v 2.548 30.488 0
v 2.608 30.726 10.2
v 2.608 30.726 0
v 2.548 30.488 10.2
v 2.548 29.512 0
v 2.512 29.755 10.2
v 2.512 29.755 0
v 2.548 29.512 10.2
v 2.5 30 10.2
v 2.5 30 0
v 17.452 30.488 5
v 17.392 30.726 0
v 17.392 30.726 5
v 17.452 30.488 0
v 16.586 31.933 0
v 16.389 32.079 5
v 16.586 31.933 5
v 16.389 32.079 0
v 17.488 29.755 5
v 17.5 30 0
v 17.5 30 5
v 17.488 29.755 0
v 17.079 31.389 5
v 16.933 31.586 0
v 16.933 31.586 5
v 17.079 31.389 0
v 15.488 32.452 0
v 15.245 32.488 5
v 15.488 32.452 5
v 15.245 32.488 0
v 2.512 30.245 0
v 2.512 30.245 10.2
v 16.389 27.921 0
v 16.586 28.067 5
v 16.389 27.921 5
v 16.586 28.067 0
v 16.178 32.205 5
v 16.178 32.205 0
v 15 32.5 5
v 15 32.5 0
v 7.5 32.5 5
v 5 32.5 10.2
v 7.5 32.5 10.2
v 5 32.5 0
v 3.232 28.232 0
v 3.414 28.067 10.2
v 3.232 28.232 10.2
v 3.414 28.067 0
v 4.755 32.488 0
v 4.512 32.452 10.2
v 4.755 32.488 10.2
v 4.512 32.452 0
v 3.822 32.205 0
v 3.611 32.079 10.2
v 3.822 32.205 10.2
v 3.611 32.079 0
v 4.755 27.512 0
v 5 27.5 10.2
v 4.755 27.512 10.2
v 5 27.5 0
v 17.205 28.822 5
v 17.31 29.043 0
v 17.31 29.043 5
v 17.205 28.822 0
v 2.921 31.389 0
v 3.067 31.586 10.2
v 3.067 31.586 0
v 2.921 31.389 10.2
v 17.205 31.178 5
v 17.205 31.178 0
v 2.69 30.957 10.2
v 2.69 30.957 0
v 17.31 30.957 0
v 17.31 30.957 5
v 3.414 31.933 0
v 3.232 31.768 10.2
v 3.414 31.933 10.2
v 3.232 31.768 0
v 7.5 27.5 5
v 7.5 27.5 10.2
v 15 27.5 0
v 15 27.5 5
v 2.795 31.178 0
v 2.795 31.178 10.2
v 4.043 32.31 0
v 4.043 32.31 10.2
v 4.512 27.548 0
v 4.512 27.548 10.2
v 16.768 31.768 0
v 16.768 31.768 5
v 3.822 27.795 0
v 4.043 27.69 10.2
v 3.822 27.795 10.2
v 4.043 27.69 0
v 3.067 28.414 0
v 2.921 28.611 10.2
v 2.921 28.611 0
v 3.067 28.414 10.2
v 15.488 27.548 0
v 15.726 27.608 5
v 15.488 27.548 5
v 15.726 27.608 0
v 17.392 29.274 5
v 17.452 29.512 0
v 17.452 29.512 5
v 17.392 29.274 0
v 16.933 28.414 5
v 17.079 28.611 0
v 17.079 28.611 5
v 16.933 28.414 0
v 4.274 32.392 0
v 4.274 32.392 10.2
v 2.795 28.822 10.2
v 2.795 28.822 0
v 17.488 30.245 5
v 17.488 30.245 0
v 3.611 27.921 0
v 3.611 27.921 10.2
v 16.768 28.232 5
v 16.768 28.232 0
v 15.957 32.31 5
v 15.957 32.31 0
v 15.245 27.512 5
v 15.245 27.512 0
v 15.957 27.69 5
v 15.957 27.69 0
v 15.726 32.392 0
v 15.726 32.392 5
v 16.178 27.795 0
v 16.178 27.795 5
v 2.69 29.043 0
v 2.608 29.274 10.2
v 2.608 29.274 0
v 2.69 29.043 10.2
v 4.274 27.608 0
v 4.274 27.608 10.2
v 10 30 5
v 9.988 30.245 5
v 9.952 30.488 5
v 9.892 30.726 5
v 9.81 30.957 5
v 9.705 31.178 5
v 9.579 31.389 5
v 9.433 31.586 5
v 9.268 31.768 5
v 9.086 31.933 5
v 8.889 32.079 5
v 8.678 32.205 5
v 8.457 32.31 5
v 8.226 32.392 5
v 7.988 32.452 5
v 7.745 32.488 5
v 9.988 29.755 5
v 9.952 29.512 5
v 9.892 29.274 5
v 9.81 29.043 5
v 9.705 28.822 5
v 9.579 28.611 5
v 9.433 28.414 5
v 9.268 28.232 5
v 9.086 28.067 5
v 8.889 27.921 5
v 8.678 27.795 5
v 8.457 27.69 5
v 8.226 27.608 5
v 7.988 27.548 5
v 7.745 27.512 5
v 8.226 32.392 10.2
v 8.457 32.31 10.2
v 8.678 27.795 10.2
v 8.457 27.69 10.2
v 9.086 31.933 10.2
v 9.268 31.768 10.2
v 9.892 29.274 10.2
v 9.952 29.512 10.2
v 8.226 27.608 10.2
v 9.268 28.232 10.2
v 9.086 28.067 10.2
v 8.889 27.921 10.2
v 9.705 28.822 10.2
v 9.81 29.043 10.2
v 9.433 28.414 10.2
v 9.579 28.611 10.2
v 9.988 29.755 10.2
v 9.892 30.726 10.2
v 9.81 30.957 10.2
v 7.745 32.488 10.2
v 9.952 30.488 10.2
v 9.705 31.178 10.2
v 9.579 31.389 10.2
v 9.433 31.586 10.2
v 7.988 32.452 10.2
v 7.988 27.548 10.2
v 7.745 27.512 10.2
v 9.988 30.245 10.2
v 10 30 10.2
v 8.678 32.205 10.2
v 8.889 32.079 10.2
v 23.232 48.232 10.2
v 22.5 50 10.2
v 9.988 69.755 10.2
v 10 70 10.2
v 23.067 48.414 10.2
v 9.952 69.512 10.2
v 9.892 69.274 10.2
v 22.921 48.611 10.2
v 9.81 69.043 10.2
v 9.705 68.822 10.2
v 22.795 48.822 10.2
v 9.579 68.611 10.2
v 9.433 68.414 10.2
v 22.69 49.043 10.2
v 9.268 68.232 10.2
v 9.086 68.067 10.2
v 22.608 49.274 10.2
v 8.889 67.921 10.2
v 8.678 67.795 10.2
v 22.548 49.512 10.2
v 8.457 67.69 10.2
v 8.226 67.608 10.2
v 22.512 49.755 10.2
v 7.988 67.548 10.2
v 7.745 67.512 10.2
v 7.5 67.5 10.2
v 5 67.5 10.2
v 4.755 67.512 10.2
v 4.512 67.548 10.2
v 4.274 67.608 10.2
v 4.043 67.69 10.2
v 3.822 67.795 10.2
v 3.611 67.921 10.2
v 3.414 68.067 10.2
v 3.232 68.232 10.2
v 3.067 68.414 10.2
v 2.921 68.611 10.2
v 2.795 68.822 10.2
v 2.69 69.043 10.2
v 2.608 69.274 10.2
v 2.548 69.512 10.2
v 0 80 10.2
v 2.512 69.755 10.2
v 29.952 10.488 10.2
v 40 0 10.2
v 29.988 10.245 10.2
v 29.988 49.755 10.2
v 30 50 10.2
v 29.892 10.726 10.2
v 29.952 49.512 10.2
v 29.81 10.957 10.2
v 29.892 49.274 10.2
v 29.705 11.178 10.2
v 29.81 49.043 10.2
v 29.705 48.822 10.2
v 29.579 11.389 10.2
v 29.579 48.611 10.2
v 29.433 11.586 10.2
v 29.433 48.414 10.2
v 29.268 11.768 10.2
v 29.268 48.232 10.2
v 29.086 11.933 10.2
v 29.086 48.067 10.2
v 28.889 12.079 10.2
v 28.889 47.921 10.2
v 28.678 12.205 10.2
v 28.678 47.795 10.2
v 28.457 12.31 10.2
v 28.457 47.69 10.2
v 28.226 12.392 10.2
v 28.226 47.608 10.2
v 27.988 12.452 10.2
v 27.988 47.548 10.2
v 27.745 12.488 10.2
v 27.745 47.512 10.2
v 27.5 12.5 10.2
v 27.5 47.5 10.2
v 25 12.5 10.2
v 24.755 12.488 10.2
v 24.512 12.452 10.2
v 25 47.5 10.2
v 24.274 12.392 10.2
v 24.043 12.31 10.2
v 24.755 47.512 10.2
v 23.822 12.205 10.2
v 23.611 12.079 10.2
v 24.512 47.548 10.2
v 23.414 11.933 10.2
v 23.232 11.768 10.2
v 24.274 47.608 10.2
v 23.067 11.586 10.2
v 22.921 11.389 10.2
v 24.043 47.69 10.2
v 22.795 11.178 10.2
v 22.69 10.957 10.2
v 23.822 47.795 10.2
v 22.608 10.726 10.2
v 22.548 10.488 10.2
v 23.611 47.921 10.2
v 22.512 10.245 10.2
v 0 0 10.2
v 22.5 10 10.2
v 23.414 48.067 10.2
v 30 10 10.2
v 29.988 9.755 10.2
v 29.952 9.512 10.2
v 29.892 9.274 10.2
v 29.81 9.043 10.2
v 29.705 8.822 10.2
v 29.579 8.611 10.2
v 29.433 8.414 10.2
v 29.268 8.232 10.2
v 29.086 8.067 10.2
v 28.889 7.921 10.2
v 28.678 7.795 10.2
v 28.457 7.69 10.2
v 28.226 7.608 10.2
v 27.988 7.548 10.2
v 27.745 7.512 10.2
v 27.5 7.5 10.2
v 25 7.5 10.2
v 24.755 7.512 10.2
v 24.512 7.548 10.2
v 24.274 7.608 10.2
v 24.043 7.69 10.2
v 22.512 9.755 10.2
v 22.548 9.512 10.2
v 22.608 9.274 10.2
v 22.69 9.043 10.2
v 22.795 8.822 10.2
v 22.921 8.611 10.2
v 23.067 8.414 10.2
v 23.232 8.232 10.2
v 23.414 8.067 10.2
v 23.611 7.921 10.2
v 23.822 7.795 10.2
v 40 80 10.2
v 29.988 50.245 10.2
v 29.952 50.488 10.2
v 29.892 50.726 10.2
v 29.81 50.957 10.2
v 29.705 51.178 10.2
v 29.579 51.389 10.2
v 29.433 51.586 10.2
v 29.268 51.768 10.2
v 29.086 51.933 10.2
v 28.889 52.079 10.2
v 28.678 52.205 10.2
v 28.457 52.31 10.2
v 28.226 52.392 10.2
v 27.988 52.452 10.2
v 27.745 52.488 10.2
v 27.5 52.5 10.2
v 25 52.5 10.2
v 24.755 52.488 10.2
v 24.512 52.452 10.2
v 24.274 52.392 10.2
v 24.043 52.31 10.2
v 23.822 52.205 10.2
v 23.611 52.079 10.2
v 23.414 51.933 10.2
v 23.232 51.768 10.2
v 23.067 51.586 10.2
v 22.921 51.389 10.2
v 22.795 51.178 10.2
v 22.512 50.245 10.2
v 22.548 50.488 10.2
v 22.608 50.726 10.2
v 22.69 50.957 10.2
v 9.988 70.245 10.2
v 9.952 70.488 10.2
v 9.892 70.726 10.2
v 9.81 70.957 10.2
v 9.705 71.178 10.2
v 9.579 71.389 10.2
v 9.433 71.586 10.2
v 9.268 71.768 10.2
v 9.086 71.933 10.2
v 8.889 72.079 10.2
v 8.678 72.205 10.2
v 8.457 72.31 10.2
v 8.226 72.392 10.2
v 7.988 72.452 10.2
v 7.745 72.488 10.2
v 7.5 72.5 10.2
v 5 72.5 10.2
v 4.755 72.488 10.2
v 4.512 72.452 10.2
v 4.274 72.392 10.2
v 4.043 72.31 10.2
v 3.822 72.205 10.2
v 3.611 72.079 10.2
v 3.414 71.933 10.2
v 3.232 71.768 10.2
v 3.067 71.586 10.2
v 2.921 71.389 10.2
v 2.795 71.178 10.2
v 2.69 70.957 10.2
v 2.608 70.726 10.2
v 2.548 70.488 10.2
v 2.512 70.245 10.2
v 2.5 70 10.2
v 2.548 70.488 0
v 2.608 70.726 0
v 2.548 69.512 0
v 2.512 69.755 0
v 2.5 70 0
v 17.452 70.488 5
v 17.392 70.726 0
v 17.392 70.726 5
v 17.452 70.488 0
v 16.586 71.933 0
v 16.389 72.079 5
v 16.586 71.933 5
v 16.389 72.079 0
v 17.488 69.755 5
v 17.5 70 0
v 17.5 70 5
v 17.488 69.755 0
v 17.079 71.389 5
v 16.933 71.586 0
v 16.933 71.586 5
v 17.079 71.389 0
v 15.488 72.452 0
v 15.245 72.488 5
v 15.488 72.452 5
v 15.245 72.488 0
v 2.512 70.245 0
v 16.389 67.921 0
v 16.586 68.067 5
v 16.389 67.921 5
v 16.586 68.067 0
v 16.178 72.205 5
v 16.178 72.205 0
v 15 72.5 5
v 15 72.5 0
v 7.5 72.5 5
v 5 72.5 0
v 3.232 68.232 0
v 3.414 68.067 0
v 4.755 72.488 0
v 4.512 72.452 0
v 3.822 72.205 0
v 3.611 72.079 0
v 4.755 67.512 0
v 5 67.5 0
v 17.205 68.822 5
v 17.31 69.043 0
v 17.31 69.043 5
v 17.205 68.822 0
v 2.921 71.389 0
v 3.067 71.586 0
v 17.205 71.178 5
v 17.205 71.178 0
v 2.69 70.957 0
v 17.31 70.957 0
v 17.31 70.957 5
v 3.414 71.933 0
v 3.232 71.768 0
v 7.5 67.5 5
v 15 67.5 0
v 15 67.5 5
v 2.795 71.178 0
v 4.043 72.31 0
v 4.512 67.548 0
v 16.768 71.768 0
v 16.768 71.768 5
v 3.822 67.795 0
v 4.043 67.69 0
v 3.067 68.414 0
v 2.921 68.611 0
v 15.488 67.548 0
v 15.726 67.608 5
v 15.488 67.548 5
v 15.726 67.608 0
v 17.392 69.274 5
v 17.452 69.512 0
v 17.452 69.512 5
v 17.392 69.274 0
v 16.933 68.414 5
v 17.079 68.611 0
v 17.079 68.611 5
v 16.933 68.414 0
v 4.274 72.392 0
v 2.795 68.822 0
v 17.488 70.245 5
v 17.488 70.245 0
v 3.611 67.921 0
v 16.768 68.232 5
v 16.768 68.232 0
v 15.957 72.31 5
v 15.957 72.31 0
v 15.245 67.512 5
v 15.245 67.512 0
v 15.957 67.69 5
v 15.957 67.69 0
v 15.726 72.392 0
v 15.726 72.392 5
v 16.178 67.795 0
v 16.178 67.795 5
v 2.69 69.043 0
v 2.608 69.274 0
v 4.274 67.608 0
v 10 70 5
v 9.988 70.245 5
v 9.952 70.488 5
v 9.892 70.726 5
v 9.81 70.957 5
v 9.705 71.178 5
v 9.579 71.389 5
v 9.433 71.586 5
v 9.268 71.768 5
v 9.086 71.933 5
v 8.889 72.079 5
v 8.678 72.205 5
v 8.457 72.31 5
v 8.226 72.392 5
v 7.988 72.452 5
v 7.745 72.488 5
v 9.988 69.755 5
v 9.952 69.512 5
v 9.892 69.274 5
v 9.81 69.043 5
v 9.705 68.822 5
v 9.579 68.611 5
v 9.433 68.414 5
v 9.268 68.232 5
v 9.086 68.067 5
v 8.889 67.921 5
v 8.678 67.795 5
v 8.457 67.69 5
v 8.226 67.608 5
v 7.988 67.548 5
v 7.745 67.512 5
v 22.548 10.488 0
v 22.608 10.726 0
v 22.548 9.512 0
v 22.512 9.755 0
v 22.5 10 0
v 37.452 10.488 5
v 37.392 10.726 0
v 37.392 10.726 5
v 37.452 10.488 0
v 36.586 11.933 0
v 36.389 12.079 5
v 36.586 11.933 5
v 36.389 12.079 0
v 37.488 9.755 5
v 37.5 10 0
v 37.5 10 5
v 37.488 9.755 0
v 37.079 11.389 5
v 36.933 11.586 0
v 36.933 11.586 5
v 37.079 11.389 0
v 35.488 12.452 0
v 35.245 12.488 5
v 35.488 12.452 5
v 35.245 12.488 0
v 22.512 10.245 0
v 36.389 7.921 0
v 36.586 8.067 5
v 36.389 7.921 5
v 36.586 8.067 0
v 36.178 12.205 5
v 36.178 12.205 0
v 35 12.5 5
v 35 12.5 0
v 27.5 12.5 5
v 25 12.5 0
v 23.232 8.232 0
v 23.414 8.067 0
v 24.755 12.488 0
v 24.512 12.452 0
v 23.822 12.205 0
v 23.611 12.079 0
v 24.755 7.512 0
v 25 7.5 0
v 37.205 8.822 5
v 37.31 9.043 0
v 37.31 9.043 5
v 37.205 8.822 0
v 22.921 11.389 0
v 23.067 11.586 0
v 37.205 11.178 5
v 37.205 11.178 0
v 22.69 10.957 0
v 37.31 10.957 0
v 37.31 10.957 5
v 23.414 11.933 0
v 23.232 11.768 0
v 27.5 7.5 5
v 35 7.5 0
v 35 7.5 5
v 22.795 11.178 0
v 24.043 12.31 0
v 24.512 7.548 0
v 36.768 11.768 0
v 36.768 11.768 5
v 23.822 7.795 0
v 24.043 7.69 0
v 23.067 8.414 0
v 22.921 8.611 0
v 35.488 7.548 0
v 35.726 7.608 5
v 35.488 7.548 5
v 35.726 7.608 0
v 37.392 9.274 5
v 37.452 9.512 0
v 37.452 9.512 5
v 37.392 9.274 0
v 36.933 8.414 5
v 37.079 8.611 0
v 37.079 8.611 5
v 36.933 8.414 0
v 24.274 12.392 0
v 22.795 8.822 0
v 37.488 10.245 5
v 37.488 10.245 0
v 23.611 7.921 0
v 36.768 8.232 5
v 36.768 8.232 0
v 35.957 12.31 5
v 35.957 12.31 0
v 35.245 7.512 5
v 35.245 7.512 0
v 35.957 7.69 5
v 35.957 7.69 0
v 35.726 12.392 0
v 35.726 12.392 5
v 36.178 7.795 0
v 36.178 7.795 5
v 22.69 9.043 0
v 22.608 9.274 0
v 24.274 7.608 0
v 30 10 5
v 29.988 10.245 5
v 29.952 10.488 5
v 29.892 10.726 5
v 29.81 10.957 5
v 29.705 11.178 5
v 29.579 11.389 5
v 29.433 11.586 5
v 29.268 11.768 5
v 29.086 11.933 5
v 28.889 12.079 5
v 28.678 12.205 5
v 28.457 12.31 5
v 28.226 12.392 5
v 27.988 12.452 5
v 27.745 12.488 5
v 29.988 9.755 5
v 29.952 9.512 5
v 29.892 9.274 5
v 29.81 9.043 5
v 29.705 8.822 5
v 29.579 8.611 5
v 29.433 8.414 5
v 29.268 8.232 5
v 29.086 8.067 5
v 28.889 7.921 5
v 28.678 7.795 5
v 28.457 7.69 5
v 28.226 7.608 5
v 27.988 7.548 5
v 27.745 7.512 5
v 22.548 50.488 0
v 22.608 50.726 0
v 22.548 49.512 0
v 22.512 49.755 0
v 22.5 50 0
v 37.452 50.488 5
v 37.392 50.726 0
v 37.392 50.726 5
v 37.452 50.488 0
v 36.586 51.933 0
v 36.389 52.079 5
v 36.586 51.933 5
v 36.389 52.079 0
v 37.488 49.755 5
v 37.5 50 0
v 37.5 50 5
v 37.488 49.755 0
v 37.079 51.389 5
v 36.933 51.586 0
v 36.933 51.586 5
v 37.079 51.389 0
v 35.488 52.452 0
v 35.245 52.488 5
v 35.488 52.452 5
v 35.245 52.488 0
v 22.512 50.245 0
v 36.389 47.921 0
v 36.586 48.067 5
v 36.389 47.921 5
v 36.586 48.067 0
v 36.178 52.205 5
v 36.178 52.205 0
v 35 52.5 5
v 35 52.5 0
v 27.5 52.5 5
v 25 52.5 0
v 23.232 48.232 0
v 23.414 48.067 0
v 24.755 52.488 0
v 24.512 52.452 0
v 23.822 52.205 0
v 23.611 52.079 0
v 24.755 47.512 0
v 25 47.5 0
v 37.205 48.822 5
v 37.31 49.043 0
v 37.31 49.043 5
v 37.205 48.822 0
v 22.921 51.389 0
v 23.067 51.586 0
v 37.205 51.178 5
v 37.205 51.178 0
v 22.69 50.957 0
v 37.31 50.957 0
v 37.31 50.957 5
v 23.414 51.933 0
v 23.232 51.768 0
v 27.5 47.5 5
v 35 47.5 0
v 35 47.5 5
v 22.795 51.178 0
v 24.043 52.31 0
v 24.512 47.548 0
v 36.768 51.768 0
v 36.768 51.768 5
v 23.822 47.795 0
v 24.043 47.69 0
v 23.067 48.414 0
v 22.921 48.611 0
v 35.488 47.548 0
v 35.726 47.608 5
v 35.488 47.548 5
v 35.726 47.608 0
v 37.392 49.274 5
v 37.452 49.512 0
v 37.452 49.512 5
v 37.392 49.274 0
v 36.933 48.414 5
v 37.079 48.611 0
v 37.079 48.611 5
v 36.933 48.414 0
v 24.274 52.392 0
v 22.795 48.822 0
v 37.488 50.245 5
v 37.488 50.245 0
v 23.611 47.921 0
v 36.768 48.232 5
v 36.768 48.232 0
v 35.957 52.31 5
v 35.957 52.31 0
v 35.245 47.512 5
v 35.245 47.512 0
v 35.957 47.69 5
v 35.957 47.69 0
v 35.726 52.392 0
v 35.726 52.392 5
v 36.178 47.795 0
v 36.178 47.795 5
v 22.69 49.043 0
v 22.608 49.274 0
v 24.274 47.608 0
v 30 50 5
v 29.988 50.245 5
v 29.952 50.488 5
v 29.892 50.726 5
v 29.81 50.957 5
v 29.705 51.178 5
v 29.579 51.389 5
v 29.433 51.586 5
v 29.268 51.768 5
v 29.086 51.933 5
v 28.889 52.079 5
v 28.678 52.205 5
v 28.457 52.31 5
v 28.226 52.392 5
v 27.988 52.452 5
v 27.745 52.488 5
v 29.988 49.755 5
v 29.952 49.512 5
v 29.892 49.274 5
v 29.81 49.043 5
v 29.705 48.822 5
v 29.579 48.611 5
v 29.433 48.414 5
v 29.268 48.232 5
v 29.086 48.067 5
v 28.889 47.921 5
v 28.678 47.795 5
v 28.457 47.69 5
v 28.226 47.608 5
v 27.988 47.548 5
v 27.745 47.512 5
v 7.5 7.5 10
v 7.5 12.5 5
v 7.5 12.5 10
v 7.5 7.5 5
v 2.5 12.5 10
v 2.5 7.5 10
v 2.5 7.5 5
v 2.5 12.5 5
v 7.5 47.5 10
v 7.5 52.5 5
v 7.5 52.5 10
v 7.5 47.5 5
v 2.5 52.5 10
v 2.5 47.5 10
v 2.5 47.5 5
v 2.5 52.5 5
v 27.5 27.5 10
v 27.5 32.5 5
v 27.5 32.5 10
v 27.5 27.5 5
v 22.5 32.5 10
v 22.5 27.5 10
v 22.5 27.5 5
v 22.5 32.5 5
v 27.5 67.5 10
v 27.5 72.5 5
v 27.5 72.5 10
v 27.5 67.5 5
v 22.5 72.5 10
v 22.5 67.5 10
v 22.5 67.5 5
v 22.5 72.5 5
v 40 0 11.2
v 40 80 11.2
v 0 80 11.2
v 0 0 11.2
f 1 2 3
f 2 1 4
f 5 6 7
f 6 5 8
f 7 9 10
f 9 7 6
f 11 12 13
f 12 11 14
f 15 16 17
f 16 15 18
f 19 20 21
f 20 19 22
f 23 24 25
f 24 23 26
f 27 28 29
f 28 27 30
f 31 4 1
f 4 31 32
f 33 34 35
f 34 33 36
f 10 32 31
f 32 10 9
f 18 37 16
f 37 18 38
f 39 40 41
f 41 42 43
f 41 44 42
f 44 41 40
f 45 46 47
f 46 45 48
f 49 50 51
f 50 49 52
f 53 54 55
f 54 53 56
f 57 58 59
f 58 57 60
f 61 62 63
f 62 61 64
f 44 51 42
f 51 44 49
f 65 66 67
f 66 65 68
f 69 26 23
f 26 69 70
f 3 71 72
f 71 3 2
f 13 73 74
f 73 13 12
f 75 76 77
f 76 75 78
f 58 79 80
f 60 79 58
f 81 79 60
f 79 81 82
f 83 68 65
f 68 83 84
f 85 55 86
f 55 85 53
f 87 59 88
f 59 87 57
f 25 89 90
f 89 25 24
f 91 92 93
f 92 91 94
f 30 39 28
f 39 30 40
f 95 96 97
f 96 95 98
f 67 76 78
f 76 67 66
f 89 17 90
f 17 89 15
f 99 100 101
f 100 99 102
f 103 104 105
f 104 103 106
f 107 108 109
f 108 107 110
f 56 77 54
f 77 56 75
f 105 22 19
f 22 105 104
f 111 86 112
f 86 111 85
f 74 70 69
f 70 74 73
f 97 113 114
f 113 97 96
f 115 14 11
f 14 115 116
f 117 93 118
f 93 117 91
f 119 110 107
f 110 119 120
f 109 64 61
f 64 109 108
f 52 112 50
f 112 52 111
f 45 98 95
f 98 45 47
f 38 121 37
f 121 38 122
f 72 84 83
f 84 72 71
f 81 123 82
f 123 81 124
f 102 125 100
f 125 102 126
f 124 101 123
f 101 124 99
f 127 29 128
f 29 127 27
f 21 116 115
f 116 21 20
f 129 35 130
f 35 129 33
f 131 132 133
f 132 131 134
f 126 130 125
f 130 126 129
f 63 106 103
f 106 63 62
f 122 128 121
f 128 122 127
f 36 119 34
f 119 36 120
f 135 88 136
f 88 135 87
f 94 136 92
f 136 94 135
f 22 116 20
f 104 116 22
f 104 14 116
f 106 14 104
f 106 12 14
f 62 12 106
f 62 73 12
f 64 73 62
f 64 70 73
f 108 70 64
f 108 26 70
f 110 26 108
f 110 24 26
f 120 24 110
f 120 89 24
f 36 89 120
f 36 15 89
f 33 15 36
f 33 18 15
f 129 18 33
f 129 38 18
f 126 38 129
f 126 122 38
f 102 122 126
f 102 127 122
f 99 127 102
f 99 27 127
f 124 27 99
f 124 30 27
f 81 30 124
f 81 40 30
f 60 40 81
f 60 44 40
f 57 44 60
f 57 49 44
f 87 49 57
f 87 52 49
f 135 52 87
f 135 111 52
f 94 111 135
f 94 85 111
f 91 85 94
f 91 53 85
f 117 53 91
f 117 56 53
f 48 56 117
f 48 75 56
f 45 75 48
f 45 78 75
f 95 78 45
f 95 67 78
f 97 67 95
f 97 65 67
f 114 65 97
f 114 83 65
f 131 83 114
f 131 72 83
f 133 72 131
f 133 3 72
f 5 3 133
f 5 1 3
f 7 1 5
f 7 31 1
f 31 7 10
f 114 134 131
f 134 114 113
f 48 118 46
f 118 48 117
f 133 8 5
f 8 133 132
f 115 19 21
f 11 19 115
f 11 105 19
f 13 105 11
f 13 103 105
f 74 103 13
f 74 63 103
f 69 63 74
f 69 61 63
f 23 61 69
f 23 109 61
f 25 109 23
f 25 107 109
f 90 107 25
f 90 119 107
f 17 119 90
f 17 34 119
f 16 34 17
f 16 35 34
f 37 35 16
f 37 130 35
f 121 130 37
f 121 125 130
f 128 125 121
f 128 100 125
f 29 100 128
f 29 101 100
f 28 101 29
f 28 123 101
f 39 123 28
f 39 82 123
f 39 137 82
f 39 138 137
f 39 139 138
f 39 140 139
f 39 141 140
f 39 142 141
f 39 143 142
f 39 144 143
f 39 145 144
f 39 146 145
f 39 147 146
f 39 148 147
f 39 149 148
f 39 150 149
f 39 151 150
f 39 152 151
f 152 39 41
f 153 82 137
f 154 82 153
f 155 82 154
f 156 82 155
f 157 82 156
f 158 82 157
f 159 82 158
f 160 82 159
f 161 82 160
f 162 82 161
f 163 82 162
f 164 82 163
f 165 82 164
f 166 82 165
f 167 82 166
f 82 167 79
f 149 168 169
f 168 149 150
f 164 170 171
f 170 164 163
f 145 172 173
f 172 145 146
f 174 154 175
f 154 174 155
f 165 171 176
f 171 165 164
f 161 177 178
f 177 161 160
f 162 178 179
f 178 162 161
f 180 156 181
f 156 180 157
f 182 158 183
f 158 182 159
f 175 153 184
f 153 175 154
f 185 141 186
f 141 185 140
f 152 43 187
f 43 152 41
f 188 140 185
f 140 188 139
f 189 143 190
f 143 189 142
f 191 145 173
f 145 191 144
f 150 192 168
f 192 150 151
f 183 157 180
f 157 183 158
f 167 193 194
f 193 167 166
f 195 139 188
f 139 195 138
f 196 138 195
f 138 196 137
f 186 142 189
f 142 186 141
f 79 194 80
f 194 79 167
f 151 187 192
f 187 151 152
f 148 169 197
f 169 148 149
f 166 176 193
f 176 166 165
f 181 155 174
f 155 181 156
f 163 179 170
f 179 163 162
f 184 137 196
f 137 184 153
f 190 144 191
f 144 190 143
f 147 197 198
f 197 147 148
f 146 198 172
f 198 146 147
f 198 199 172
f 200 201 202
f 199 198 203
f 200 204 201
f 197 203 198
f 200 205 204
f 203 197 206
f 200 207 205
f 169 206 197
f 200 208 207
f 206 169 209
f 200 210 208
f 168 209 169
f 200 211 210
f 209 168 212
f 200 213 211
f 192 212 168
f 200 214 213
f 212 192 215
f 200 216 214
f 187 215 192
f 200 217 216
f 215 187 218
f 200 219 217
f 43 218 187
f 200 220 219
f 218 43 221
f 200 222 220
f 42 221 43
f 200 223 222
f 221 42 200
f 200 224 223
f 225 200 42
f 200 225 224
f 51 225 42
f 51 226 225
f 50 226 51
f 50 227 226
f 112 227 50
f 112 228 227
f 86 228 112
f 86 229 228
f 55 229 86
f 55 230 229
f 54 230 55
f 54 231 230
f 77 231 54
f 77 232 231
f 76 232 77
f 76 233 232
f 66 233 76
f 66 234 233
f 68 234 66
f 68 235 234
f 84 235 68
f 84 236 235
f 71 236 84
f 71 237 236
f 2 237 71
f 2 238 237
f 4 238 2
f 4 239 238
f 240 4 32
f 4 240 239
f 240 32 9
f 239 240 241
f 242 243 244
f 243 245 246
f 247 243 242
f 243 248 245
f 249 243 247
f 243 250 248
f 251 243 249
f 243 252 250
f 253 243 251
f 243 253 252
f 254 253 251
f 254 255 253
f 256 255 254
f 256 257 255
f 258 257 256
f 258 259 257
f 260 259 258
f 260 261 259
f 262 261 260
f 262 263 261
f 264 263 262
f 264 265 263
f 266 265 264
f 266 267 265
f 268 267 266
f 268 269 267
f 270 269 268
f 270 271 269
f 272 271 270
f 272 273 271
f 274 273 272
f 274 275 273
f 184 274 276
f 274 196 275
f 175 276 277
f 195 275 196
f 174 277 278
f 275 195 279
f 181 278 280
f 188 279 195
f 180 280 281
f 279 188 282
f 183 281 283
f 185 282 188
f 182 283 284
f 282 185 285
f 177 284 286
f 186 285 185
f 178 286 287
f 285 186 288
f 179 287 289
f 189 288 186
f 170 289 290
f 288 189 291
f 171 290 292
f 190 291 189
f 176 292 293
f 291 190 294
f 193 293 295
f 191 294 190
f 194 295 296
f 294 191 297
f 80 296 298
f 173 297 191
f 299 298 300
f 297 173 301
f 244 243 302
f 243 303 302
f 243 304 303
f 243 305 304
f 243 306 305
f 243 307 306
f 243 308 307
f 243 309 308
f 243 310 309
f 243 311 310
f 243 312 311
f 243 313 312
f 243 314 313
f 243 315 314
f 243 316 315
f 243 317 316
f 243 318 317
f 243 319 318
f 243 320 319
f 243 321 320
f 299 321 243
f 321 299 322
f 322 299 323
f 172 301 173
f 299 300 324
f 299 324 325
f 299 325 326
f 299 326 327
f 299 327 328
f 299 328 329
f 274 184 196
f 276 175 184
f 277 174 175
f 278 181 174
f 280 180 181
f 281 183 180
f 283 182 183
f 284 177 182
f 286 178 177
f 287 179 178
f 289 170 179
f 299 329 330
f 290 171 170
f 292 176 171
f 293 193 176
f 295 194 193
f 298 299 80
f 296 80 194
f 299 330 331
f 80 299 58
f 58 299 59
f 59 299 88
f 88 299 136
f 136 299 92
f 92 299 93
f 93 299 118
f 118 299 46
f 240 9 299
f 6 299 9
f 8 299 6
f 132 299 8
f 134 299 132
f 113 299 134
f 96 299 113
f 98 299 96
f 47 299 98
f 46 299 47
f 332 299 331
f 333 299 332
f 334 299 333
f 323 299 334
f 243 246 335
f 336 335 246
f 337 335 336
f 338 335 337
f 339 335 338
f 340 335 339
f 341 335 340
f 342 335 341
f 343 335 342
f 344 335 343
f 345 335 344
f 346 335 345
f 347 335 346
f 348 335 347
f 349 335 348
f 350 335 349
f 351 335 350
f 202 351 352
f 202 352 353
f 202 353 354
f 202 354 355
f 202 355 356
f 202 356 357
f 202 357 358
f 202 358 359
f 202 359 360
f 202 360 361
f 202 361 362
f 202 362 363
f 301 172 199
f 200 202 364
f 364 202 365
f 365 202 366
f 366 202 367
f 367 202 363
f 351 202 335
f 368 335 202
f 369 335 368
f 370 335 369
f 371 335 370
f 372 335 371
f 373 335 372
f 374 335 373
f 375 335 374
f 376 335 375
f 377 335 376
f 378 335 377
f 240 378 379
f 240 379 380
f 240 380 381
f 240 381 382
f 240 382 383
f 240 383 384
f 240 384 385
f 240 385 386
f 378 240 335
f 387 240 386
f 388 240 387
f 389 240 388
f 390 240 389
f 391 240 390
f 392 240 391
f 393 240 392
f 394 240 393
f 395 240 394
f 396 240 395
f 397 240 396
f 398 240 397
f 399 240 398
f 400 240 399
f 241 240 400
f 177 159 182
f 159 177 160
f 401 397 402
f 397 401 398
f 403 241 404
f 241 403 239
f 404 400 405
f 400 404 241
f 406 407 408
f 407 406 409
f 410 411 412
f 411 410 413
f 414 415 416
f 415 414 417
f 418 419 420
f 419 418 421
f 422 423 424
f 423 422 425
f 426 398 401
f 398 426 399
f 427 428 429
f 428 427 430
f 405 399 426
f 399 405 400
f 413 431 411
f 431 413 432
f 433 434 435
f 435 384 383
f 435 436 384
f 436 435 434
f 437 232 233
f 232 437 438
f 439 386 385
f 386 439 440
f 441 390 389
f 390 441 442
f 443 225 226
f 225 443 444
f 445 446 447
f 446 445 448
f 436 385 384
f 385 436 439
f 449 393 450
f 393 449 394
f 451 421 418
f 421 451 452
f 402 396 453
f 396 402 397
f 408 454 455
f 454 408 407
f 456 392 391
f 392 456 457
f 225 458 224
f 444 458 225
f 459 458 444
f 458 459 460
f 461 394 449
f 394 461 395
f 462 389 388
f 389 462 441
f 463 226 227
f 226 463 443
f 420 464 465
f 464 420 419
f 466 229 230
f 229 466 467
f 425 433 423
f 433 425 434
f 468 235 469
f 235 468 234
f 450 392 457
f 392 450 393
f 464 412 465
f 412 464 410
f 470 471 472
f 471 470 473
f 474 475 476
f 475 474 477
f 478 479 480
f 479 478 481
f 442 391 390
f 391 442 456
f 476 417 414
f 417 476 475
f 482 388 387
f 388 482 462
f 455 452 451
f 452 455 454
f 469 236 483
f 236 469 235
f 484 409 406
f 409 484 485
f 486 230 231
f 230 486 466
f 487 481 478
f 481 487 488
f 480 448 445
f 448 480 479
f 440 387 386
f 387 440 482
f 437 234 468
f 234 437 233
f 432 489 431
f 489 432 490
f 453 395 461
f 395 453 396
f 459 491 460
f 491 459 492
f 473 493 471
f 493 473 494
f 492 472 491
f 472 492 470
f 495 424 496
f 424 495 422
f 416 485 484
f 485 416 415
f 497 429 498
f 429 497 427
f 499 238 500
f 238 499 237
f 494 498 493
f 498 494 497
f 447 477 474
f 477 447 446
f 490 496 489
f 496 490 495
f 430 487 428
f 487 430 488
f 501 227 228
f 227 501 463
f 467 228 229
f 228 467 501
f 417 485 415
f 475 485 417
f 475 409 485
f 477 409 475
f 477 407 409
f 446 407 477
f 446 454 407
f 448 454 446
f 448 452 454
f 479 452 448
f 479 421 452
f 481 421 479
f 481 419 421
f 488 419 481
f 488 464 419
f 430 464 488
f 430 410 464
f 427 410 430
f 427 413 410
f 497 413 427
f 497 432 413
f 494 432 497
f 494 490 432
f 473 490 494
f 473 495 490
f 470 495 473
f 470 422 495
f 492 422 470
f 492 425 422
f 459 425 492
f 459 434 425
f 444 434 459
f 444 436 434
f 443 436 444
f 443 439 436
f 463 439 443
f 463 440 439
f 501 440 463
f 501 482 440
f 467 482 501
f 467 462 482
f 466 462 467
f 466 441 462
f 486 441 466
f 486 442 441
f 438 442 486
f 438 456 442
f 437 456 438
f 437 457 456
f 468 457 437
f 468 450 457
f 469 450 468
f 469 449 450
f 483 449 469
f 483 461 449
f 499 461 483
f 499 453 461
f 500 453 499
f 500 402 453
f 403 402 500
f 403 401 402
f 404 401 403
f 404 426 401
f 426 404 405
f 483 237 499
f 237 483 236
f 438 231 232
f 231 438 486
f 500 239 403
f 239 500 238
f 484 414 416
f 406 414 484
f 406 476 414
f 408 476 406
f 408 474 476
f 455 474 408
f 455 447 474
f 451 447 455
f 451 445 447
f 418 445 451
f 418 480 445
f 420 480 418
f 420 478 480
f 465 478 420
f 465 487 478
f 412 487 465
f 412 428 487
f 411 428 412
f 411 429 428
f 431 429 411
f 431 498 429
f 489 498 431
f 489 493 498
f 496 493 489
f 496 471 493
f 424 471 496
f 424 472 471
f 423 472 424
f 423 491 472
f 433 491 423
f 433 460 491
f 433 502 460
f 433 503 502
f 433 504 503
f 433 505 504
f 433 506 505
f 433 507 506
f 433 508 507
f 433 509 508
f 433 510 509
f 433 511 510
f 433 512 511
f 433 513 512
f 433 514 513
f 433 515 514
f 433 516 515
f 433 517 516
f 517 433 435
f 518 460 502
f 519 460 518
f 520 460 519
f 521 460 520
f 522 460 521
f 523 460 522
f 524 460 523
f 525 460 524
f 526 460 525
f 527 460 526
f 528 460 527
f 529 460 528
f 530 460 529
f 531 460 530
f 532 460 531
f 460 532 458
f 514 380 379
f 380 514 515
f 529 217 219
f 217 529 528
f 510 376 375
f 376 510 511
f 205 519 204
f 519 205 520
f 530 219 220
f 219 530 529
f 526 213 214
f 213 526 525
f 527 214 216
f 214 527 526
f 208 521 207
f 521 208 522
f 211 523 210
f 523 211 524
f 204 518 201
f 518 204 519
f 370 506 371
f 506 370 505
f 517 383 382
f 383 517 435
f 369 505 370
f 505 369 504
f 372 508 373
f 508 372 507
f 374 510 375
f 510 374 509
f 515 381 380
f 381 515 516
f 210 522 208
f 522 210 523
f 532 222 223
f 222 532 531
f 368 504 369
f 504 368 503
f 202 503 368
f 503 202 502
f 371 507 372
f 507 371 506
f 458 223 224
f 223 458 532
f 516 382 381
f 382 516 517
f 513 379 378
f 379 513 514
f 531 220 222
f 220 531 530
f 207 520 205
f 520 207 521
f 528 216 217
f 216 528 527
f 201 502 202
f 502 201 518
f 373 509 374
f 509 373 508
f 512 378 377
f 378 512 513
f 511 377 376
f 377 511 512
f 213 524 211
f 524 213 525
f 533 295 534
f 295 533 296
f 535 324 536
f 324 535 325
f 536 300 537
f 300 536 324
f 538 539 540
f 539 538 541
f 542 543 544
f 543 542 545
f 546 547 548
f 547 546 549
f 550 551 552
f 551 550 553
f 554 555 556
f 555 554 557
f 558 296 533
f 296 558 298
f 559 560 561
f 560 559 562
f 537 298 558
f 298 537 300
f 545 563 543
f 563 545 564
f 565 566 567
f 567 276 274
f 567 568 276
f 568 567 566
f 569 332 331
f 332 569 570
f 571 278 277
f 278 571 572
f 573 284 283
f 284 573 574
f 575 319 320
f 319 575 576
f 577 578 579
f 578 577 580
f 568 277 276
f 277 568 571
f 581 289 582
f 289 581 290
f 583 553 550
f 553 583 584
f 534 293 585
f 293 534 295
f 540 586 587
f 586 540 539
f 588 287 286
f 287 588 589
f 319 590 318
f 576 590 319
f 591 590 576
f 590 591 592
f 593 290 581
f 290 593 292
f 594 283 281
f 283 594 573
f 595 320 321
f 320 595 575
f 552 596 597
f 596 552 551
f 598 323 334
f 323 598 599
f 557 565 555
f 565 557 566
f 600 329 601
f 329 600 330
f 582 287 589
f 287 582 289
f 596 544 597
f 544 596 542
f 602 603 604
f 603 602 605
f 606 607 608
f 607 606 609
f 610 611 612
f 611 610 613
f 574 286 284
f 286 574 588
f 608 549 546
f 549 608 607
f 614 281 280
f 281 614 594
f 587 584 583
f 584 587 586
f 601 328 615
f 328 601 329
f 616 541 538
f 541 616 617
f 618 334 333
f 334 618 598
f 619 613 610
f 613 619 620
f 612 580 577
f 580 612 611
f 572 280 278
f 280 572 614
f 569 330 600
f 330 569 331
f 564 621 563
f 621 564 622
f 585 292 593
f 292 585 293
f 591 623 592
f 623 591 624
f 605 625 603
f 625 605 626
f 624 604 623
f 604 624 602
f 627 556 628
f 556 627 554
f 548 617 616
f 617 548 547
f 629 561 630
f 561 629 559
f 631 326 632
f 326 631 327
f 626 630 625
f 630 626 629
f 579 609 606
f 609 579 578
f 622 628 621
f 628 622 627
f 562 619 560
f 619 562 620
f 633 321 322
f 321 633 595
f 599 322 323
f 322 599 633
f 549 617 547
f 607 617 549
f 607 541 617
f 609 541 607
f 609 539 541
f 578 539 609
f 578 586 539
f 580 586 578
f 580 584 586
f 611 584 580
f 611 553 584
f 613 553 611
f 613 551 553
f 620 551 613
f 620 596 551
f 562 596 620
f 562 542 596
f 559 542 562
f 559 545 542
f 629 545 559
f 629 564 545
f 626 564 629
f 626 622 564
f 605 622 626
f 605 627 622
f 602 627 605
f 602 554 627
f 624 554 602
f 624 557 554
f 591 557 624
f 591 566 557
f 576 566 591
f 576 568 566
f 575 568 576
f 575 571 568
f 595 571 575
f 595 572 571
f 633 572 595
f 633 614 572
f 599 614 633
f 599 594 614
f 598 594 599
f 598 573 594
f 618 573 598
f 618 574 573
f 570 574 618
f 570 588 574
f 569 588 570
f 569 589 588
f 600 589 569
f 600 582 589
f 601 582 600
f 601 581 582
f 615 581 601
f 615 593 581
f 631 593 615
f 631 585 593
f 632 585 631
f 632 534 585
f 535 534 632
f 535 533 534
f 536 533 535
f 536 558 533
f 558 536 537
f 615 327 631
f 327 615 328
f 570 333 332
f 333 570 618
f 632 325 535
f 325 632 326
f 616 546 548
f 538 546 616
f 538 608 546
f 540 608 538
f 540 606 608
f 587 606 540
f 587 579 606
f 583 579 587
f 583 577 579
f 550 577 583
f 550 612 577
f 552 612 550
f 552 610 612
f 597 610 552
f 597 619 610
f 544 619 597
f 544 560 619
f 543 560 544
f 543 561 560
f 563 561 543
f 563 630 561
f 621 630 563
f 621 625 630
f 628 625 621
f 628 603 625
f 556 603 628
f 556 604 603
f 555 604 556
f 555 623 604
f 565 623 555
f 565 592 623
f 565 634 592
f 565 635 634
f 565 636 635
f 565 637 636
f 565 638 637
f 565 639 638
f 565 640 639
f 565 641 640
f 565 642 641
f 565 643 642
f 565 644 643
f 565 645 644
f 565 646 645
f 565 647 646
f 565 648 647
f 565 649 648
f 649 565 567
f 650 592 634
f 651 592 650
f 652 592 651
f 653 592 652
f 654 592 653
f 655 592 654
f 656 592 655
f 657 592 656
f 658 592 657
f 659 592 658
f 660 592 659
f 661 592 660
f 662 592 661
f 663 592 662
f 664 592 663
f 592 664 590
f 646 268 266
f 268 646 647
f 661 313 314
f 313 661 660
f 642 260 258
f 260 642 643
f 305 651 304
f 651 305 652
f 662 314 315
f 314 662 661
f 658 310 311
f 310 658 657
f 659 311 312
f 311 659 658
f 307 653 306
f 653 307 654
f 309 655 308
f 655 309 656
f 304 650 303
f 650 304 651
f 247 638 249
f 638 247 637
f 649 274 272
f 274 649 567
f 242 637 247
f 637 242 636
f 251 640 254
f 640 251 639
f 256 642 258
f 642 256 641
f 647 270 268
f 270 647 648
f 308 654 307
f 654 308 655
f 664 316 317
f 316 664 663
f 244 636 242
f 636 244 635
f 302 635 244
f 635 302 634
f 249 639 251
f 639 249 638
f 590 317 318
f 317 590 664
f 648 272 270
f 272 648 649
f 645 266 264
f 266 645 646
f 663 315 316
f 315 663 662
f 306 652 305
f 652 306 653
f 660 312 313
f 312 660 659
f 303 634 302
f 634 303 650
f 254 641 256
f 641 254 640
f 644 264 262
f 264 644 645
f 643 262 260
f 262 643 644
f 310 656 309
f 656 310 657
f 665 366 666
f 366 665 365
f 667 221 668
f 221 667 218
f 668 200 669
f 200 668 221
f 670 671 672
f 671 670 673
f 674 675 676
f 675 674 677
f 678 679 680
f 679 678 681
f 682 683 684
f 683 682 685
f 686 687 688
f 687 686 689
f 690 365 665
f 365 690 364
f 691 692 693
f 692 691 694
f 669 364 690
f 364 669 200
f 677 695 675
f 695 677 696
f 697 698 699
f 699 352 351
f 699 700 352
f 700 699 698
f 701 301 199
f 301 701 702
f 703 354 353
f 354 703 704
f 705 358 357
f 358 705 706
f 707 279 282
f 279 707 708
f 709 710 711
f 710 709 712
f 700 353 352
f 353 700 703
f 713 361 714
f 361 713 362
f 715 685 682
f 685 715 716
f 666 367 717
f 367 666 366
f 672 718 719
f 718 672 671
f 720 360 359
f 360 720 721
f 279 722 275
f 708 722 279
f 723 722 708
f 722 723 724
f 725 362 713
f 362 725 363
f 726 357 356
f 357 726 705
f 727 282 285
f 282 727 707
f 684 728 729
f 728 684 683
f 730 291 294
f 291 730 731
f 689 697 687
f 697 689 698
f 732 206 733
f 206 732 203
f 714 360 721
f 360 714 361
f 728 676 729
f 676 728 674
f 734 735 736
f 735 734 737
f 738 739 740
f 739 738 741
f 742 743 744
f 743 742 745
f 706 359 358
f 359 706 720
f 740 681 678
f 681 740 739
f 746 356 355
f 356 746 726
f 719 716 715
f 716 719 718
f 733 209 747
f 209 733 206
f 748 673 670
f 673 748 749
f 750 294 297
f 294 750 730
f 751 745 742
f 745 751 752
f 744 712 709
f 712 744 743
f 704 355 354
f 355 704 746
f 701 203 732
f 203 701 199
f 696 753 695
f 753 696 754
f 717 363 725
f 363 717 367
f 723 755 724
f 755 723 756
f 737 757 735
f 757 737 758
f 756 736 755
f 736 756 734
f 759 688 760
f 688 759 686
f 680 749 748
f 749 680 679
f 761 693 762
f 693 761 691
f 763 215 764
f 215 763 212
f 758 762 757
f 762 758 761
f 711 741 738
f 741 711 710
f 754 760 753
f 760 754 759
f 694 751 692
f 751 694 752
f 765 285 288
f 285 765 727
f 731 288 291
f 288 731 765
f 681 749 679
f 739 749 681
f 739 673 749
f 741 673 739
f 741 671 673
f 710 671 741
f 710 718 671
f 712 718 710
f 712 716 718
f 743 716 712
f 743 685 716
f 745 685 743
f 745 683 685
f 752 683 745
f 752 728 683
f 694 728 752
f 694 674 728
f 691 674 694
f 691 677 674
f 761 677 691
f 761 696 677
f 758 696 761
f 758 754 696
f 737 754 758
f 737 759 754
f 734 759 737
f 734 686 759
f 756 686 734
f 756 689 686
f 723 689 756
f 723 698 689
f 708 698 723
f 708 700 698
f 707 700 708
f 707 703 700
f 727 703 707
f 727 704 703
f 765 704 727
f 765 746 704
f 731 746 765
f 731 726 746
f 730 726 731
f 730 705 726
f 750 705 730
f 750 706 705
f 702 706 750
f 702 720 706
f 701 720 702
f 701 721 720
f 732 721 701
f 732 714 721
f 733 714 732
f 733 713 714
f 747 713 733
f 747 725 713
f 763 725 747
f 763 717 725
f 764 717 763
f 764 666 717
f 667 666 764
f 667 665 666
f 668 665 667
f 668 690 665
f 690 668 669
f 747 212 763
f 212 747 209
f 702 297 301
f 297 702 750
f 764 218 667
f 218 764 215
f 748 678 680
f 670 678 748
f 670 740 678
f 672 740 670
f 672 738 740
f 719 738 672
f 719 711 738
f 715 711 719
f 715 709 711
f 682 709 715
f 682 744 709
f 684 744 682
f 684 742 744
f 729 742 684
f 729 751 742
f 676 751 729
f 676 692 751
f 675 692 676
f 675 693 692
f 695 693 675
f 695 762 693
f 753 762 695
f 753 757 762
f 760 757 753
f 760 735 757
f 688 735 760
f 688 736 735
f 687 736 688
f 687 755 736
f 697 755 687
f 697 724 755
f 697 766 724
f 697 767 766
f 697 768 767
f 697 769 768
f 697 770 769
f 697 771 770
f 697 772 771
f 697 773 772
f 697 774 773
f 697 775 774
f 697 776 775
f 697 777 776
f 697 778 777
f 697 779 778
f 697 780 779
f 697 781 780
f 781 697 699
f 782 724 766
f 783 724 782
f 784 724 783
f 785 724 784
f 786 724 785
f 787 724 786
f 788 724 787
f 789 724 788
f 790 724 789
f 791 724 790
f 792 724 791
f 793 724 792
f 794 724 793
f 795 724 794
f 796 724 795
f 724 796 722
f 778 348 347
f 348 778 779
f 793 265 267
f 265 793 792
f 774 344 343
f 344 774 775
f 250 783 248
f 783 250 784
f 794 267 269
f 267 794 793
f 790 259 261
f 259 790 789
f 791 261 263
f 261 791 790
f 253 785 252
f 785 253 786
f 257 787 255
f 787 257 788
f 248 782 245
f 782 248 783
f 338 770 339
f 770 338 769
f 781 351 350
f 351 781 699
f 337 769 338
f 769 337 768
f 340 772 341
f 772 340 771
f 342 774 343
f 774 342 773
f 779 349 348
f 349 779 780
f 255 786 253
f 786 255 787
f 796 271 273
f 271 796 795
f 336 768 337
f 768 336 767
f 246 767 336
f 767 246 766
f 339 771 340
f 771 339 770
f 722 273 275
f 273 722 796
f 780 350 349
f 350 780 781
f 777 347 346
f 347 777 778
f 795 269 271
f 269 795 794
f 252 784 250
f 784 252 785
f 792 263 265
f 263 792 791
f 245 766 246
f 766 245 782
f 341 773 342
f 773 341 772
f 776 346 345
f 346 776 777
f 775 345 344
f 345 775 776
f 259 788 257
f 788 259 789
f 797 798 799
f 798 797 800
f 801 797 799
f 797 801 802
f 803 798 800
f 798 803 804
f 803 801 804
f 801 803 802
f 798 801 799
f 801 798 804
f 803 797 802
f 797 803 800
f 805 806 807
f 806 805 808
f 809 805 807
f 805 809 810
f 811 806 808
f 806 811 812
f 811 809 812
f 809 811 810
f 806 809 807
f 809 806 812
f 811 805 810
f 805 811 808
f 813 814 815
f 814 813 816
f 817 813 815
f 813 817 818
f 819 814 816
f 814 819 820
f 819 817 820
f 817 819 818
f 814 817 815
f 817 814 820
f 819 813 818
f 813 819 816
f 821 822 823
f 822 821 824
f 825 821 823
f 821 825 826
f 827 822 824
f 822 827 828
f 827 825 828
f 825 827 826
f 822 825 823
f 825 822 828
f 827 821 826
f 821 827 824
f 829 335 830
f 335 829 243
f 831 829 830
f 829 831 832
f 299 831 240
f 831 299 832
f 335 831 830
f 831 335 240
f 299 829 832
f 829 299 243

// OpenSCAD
// --------------------------------------------------------------
//  IKEA SKÅDIS peg tile: 2 x 2 pegs per tile, tile_x by tile_y tiles
//  Peg dimensions and spacing match
//  IKEA-Skadis-Pegboard-Mount.scad by Angel Roman:
//  https://github.com/legna-namor/IKEA-Skadis-Pegboard-Mount-Generator
//
//  Axes (same as the original):
//    +X  down the board; hooks hang toward +X
//    +Y  across the board
//    +Z  away from the board; hook tips at Z = 0, backplate on top
//
//  Each tile is exactly one repeat of the SKÅDIS slot pattern
//  (40 mm on X, 80 mm on Y). The tile_x by tile_y tiles share one
//  backplate, and every slot under it gets exactly one peg. To tile
//  the finished part again with no gap, offset copies by
//    X = tile_x * 40 mm
//    Y = tile_y * 80 mm
//
//  STEP export: one solid for the backplate, one per peg and one per
//  locating cube, with the cubes in a group named "Locating cubes":
//    uv run IKEA-Skadis-Peg-Tile-to-STEP.py   values below
//    uv run IKEA-Skadis-Peg-Tile-to-STEP.py --tiles 1x1 3x2 --clearance 0 0.1
//                                             one file per combination
//  Files go to step-files/clearance-<clearance>/ and are named
//  IKEA-Skadis-Peg-Tile_<tile_x>x<tile_y>-offset-<X>x<Y>.step, where X and Y
//  are the offsets in mm for tiling that part. A clearance above 0 also
//  adds -clearance-<clearance> before .step.
//  The script reads the STEP_* echo lines at the bottom of this file.
// --------------------------------------------------------------

// Number of tiles along X, down the board (whole number, 1 or more)
tile_x = 1;
// Number of tiles along Y, across the board (whole number, 1 or more)
tile_y = 1;
// Clearance per side in mm: moves each side face of every peg inward (0.1 gives 4.8 mm wide pegs)
clearance = 0;

$fn = 64;

// SKÅDIS slot lattice: slots in a row are slot_pitch apart; rows are
// row_pitch apart and every other row is shifted row_pitch across.
slot_pitch = 40;
row_pitch  = 20;

// Peg profile in mm (same values as the original mount).
peg_d    = 5;    // slot width
hook_len = 15;   // hook length, equal to the slot height
hook_h   = 5;    // hook thickness behind the board
neck_len = 7.5;
neck_h   = 5.2;  // gap for the board, which is about 5 mm thick

assert(clearance >= 0 && clearance < peg_d / 2,
       str("clearance must be at least 0 and less than ", peg_d / 2, " mm"));

// Peg outline after clearance. Every side face moves inward by clearance,
// so the round ends keep their centers and each peg stays on its slot.
peg_w  = peg_d - 2 * clearance;
hook_l = hook_len - 2 * clearance;
neck_l = neck_len - 2 * clearance;

plate_t = 1;

// One repeat of the lattice: 2 rows x 2 pegs.
tile_size_x = 2 * row_pitch;   // 40
tile_size_y = 2 * slot_pitch;  // 80

// Centers each tile's pegs on that tile.
margin_x = (tile_size_x - (row_pitch + hook_len)) / 2;            // 2.5
margin_y = (tile_size_y - (slot_pitch + row_pitch + peg_d)) / 2;  // 7.5

// Peg origins (center of the hook's upper round end, the origin of skadis_peg()),
// numbered row by row. Each tile holds 2 rows of 2 pegs; even rows are
// shifted row_pitch across from odd rows.
pegs = [
    for (row = [0 : 2 * tile_x - 1], col = [0 : 2 * tile_y - 1])
        [margin_x + peg_d / 2 + row * row_pitch,
         margin_y + peg_d / 2 + (1 - row % 2) * row_pitch + col * slot_pitch]
];

align = [
    for (row = [0 : 2 * tile_x - 1], col = [0 : 2 * tile_y - 1])
        [margin_x + peg_d / 2 + row * row_pitch,
         margin_y + peg_d / 2 + (row % 2) * row_pitch + col * slot_pitch]
];

// Locating cubes for alignment in CAD, as [corner, size]: a cube of side
// peg_w centered on each align point, from Z = 5. The render below and the
// STEP export both use this list.
locating_cubes = [for (a = align) [[a[0] - peg_w / 2, a[1] - peg_w / 2, 5], peg_w]];

plate_size = [tile_x * tile_size_x, tile_y * tile_size_y, plate_t];
plate_z = hook_h + neck_h;  // 10.2

// --------------------------------------------------------------
// Slot outline: width d, overall length len along +X, first round end
// centered on the origin.
module slot_outline(len, d) {
    hull() for (x = [0, len - d]) translate([x, 0]) circle(d = d);
}

// One peg: the hook hangs behind the board, the neck passes through the slot.
module skadis_peg() {
    linear_extrude(hook_h) slot_outline(hook_l, peg_w);
    translate([0, 0, hook_h]) linear_extrude(neck_h) slot_outline(neck_l, peg_w);
}

module debug_cross(size=10, thickness=0.2, light=false) {
    // X-axis (Red)
    color(light ? "pink" : "red") cube([size, thickness, thickness], center=true);
    // Y-axis (Green)
    color(light ? "lime" : "green") cube([thickness, size, thickness], center=true);
    // Z-axis (Blue)
    color(light ? "lightblue" : "blue") cube([thickness, thickness, size], center=true);
}


// --------------------------------------------------------------
for (p = pegs) translate([p[0], p[1], 0]) skadis_peg() ;
// -- locating pins
{
    for (c = locating_cubes) {
        translate(c[0])
        color("blue")
        cube(c[1]);
    }
}
translate([0, 0, plate_z]) cube(plate_size);

// Layout for IKEA-Skadis-Peg-Tile-to-STEP.py.
echo(STEP_PEG = [peg_w, hook_l, hook_h, neck_l, neck_h]);
echo(STEP_PEGS = pegs);
echo(STEP_CUBES = locating_cubes);
echo(STEP_PLATE = [[0, 0, plate_z], plate_size]);
echo(STEP_TILES = [tile_x, tile_y]);
echo(STEP_CLEARANCE = clearance);
